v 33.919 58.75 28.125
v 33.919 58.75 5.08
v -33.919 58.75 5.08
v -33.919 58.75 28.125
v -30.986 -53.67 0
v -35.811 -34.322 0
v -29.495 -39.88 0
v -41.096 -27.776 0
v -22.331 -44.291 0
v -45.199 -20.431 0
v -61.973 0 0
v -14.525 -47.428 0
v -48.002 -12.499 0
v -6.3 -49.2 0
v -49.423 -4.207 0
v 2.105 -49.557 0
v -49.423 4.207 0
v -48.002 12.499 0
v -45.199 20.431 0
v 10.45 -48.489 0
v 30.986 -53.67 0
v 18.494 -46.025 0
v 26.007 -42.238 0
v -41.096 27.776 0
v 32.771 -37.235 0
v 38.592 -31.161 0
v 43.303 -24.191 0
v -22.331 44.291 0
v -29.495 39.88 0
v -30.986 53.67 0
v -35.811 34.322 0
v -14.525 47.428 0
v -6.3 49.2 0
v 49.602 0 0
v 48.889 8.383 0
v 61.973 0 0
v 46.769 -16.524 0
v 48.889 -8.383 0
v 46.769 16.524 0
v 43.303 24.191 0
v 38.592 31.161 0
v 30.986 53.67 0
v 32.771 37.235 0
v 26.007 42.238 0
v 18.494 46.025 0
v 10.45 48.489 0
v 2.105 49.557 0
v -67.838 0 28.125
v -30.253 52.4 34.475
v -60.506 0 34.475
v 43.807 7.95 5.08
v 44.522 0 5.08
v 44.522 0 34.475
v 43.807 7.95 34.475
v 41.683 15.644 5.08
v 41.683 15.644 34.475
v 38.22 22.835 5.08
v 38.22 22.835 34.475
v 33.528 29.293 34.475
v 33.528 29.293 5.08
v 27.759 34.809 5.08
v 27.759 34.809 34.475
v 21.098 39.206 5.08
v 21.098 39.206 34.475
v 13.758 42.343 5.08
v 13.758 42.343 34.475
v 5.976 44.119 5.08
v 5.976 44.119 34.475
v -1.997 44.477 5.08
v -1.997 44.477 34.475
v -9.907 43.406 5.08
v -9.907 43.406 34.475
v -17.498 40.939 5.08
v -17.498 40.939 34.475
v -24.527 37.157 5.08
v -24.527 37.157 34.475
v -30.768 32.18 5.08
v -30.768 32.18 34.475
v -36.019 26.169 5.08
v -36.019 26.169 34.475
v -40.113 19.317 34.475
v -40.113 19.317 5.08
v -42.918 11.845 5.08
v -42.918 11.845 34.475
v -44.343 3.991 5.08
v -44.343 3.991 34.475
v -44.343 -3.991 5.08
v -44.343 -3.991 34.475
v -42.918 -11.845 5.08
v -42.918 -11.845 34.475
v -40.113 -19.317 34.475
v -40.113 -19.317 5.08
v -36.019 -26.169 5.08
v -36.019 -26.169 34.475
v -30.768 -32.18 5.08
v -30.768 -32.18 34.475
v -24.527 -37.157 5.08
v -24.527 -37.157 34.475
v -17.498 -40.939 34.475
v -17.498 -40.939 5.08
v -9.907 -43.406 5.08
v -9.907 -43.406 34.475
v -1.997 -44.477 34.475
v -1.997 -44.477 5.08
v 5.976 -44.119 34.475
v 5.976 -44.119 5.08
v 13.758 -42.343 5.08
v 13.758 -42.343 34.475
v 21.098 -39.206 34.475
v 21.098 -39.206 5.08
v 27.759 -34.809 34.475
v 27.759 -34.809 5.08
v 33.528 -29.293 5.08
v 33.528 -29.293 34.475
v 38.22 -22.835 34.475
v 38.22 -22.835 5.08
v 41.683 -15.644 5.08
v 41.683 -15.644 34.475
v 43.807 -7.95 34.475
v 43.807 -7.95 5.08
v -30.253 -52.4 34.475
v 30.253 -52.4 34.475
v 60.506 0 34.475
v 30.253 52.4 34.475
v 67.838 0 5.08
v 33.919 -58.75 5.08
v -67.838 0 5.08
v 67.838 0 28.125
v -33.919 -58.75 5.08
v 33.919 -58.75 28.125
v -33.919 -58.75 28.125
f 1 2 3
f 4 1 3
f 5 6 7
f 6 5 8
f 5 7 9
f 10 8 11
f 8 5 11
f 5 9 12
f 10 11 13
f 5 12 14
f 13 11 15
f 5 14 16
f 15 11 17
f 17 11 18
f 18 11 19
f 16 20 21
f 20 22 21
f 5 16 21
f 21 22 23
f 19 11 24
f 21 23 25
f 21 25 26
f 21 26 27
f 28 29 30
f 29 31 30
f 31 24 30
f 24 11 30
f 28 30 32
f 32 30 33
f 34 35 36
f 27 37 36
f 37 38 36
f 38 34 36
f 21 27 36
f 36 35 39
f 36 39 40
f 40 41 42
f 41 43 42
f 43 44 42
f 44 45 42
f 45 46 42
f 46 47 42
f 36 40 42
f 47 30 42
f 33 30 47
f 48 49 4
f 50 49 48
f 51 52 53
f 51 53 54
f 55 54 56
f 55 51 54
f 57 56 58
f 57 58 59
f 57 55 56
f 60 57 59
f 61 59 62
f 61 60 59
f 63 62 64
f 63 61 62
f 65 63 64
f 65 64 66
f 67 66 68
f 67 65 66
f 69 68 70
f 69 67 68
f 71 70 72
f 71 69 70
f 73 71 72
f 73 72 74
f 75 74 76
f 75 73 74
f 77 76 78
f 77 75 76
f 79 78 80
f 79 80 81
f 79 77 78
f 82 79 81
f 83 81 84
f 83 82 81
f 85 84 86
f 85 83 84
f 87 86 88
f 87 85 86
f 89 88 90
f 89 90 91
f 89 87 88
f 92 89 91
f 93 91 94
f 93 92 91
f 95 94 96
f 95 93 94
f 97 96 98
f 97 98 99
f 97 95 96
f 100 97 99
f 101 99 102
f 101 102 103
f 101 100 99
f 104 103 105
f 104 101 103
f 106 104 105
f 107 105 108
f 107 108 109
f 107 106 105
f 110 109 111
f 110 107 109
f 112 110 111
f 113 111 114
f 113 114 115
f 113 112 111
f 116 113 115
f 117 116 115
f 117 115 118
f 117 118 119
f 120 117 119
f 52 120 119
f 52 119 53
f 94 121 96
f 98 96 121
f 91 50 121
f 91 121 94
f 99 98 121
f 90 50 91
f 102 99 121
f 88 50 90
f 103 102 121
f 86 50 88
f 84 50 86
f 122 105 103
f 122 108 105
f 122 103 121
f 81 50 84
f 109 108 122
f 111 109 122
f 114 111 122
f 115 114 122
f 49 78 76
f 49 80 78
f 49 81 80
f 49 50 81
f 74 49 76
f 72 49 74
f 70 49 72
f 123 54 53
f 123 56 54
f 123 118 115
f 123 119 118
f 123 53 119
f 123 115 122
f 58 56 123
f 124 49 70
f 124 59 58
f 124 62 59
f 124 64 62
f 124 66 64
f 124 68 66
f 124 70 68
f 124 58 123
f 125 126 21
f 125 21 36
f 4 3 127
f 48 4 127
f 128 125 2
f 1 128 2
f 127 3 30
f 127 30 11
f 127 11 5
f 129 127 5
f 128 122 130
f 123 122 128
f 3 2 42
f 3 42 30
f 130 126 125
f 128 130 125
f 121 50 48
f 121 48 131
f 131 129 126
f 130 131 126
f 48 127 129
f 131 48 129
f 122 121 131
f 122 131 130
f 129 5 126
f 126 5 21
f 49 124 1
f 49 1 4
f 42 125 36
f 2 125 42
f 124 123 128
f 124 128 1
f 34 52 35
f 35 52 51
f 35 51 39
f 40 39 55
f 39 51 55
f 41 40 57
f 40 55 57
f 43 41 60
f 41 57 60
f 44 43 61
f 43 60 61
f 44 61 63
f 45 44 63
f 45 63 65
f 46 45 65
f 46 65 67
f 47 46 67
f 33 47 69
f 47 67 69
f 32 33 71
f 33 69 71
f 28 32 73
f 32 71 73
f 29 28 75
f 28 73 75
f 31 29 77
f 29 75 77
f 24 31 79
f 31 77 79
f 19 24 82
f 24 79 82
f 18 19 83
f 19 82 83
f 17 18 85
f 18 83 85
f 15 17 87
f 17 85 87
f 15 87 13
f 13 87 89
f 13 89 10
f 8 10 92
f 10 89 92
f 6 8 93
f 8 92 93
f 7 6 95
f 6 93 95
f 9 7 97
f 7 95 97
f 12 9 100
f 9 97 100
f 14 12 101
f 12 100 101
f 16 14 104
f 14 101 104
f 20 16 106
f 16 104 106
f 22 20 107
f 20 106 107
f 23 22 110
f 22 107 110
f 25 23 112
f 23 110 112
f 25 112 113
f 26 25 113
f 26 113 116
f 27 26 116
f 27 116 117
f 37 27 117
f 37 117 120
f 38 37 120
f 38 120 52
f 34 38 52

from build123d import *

# Parameters (mm, degrees)
F1_R     = 44.522092
F2_DEPTH = 34.475029
F3_SIZE  = 6.35
F4_SIZE  = 5.08


with BuildPart() as f2:
    # F1 (on face) → F2 (new body)
    with BuildSketch(Plane.XY):
        Polygon((-33.91923, -58.74983), (33.91923, -58.74983), (67.83846, 0), (33.91923, 58.74983), (-33.91923, 58.74983), (-67.83846, 0), align=None)
        Circle(F1_R, mode=Mode.SUBTRACT)
    extrude(amount=F2_DEPTH)

    # F3
    f3_edges = [f2.edges().sort_by_distance(p)[0] for p in [
        (0, 58.74983, 34.475029),
        (-50.878845, -29.374915, 34.475029),
        (50.878845, 29.374915, 34.475029),
        (0, -58.74983, 34.475029),
        (50.878845, -29.374915, 34.475029),
        (-50.878845, 29.374915, 34.475029),
    ]]
    chamfer(f3_edges, length=F3_SIZE)

    # F4
    f4_edges = [f2.edges().sort_by_distance(p)[0] for p in [
        (50.878845, -29.374915, 0),
        (50.878845, 29.374915, 0),
        (0, 58.74983, 0),
        (-50.878845, 29.374915, 0),
        (-50.878845, -29.374915, 0),
        (0, -58.74983, 0),
        (-44.522092, 0, 0),
    ]]
    chamfer(f4_edges, length=F4_SIZE)


solid = f2.part
